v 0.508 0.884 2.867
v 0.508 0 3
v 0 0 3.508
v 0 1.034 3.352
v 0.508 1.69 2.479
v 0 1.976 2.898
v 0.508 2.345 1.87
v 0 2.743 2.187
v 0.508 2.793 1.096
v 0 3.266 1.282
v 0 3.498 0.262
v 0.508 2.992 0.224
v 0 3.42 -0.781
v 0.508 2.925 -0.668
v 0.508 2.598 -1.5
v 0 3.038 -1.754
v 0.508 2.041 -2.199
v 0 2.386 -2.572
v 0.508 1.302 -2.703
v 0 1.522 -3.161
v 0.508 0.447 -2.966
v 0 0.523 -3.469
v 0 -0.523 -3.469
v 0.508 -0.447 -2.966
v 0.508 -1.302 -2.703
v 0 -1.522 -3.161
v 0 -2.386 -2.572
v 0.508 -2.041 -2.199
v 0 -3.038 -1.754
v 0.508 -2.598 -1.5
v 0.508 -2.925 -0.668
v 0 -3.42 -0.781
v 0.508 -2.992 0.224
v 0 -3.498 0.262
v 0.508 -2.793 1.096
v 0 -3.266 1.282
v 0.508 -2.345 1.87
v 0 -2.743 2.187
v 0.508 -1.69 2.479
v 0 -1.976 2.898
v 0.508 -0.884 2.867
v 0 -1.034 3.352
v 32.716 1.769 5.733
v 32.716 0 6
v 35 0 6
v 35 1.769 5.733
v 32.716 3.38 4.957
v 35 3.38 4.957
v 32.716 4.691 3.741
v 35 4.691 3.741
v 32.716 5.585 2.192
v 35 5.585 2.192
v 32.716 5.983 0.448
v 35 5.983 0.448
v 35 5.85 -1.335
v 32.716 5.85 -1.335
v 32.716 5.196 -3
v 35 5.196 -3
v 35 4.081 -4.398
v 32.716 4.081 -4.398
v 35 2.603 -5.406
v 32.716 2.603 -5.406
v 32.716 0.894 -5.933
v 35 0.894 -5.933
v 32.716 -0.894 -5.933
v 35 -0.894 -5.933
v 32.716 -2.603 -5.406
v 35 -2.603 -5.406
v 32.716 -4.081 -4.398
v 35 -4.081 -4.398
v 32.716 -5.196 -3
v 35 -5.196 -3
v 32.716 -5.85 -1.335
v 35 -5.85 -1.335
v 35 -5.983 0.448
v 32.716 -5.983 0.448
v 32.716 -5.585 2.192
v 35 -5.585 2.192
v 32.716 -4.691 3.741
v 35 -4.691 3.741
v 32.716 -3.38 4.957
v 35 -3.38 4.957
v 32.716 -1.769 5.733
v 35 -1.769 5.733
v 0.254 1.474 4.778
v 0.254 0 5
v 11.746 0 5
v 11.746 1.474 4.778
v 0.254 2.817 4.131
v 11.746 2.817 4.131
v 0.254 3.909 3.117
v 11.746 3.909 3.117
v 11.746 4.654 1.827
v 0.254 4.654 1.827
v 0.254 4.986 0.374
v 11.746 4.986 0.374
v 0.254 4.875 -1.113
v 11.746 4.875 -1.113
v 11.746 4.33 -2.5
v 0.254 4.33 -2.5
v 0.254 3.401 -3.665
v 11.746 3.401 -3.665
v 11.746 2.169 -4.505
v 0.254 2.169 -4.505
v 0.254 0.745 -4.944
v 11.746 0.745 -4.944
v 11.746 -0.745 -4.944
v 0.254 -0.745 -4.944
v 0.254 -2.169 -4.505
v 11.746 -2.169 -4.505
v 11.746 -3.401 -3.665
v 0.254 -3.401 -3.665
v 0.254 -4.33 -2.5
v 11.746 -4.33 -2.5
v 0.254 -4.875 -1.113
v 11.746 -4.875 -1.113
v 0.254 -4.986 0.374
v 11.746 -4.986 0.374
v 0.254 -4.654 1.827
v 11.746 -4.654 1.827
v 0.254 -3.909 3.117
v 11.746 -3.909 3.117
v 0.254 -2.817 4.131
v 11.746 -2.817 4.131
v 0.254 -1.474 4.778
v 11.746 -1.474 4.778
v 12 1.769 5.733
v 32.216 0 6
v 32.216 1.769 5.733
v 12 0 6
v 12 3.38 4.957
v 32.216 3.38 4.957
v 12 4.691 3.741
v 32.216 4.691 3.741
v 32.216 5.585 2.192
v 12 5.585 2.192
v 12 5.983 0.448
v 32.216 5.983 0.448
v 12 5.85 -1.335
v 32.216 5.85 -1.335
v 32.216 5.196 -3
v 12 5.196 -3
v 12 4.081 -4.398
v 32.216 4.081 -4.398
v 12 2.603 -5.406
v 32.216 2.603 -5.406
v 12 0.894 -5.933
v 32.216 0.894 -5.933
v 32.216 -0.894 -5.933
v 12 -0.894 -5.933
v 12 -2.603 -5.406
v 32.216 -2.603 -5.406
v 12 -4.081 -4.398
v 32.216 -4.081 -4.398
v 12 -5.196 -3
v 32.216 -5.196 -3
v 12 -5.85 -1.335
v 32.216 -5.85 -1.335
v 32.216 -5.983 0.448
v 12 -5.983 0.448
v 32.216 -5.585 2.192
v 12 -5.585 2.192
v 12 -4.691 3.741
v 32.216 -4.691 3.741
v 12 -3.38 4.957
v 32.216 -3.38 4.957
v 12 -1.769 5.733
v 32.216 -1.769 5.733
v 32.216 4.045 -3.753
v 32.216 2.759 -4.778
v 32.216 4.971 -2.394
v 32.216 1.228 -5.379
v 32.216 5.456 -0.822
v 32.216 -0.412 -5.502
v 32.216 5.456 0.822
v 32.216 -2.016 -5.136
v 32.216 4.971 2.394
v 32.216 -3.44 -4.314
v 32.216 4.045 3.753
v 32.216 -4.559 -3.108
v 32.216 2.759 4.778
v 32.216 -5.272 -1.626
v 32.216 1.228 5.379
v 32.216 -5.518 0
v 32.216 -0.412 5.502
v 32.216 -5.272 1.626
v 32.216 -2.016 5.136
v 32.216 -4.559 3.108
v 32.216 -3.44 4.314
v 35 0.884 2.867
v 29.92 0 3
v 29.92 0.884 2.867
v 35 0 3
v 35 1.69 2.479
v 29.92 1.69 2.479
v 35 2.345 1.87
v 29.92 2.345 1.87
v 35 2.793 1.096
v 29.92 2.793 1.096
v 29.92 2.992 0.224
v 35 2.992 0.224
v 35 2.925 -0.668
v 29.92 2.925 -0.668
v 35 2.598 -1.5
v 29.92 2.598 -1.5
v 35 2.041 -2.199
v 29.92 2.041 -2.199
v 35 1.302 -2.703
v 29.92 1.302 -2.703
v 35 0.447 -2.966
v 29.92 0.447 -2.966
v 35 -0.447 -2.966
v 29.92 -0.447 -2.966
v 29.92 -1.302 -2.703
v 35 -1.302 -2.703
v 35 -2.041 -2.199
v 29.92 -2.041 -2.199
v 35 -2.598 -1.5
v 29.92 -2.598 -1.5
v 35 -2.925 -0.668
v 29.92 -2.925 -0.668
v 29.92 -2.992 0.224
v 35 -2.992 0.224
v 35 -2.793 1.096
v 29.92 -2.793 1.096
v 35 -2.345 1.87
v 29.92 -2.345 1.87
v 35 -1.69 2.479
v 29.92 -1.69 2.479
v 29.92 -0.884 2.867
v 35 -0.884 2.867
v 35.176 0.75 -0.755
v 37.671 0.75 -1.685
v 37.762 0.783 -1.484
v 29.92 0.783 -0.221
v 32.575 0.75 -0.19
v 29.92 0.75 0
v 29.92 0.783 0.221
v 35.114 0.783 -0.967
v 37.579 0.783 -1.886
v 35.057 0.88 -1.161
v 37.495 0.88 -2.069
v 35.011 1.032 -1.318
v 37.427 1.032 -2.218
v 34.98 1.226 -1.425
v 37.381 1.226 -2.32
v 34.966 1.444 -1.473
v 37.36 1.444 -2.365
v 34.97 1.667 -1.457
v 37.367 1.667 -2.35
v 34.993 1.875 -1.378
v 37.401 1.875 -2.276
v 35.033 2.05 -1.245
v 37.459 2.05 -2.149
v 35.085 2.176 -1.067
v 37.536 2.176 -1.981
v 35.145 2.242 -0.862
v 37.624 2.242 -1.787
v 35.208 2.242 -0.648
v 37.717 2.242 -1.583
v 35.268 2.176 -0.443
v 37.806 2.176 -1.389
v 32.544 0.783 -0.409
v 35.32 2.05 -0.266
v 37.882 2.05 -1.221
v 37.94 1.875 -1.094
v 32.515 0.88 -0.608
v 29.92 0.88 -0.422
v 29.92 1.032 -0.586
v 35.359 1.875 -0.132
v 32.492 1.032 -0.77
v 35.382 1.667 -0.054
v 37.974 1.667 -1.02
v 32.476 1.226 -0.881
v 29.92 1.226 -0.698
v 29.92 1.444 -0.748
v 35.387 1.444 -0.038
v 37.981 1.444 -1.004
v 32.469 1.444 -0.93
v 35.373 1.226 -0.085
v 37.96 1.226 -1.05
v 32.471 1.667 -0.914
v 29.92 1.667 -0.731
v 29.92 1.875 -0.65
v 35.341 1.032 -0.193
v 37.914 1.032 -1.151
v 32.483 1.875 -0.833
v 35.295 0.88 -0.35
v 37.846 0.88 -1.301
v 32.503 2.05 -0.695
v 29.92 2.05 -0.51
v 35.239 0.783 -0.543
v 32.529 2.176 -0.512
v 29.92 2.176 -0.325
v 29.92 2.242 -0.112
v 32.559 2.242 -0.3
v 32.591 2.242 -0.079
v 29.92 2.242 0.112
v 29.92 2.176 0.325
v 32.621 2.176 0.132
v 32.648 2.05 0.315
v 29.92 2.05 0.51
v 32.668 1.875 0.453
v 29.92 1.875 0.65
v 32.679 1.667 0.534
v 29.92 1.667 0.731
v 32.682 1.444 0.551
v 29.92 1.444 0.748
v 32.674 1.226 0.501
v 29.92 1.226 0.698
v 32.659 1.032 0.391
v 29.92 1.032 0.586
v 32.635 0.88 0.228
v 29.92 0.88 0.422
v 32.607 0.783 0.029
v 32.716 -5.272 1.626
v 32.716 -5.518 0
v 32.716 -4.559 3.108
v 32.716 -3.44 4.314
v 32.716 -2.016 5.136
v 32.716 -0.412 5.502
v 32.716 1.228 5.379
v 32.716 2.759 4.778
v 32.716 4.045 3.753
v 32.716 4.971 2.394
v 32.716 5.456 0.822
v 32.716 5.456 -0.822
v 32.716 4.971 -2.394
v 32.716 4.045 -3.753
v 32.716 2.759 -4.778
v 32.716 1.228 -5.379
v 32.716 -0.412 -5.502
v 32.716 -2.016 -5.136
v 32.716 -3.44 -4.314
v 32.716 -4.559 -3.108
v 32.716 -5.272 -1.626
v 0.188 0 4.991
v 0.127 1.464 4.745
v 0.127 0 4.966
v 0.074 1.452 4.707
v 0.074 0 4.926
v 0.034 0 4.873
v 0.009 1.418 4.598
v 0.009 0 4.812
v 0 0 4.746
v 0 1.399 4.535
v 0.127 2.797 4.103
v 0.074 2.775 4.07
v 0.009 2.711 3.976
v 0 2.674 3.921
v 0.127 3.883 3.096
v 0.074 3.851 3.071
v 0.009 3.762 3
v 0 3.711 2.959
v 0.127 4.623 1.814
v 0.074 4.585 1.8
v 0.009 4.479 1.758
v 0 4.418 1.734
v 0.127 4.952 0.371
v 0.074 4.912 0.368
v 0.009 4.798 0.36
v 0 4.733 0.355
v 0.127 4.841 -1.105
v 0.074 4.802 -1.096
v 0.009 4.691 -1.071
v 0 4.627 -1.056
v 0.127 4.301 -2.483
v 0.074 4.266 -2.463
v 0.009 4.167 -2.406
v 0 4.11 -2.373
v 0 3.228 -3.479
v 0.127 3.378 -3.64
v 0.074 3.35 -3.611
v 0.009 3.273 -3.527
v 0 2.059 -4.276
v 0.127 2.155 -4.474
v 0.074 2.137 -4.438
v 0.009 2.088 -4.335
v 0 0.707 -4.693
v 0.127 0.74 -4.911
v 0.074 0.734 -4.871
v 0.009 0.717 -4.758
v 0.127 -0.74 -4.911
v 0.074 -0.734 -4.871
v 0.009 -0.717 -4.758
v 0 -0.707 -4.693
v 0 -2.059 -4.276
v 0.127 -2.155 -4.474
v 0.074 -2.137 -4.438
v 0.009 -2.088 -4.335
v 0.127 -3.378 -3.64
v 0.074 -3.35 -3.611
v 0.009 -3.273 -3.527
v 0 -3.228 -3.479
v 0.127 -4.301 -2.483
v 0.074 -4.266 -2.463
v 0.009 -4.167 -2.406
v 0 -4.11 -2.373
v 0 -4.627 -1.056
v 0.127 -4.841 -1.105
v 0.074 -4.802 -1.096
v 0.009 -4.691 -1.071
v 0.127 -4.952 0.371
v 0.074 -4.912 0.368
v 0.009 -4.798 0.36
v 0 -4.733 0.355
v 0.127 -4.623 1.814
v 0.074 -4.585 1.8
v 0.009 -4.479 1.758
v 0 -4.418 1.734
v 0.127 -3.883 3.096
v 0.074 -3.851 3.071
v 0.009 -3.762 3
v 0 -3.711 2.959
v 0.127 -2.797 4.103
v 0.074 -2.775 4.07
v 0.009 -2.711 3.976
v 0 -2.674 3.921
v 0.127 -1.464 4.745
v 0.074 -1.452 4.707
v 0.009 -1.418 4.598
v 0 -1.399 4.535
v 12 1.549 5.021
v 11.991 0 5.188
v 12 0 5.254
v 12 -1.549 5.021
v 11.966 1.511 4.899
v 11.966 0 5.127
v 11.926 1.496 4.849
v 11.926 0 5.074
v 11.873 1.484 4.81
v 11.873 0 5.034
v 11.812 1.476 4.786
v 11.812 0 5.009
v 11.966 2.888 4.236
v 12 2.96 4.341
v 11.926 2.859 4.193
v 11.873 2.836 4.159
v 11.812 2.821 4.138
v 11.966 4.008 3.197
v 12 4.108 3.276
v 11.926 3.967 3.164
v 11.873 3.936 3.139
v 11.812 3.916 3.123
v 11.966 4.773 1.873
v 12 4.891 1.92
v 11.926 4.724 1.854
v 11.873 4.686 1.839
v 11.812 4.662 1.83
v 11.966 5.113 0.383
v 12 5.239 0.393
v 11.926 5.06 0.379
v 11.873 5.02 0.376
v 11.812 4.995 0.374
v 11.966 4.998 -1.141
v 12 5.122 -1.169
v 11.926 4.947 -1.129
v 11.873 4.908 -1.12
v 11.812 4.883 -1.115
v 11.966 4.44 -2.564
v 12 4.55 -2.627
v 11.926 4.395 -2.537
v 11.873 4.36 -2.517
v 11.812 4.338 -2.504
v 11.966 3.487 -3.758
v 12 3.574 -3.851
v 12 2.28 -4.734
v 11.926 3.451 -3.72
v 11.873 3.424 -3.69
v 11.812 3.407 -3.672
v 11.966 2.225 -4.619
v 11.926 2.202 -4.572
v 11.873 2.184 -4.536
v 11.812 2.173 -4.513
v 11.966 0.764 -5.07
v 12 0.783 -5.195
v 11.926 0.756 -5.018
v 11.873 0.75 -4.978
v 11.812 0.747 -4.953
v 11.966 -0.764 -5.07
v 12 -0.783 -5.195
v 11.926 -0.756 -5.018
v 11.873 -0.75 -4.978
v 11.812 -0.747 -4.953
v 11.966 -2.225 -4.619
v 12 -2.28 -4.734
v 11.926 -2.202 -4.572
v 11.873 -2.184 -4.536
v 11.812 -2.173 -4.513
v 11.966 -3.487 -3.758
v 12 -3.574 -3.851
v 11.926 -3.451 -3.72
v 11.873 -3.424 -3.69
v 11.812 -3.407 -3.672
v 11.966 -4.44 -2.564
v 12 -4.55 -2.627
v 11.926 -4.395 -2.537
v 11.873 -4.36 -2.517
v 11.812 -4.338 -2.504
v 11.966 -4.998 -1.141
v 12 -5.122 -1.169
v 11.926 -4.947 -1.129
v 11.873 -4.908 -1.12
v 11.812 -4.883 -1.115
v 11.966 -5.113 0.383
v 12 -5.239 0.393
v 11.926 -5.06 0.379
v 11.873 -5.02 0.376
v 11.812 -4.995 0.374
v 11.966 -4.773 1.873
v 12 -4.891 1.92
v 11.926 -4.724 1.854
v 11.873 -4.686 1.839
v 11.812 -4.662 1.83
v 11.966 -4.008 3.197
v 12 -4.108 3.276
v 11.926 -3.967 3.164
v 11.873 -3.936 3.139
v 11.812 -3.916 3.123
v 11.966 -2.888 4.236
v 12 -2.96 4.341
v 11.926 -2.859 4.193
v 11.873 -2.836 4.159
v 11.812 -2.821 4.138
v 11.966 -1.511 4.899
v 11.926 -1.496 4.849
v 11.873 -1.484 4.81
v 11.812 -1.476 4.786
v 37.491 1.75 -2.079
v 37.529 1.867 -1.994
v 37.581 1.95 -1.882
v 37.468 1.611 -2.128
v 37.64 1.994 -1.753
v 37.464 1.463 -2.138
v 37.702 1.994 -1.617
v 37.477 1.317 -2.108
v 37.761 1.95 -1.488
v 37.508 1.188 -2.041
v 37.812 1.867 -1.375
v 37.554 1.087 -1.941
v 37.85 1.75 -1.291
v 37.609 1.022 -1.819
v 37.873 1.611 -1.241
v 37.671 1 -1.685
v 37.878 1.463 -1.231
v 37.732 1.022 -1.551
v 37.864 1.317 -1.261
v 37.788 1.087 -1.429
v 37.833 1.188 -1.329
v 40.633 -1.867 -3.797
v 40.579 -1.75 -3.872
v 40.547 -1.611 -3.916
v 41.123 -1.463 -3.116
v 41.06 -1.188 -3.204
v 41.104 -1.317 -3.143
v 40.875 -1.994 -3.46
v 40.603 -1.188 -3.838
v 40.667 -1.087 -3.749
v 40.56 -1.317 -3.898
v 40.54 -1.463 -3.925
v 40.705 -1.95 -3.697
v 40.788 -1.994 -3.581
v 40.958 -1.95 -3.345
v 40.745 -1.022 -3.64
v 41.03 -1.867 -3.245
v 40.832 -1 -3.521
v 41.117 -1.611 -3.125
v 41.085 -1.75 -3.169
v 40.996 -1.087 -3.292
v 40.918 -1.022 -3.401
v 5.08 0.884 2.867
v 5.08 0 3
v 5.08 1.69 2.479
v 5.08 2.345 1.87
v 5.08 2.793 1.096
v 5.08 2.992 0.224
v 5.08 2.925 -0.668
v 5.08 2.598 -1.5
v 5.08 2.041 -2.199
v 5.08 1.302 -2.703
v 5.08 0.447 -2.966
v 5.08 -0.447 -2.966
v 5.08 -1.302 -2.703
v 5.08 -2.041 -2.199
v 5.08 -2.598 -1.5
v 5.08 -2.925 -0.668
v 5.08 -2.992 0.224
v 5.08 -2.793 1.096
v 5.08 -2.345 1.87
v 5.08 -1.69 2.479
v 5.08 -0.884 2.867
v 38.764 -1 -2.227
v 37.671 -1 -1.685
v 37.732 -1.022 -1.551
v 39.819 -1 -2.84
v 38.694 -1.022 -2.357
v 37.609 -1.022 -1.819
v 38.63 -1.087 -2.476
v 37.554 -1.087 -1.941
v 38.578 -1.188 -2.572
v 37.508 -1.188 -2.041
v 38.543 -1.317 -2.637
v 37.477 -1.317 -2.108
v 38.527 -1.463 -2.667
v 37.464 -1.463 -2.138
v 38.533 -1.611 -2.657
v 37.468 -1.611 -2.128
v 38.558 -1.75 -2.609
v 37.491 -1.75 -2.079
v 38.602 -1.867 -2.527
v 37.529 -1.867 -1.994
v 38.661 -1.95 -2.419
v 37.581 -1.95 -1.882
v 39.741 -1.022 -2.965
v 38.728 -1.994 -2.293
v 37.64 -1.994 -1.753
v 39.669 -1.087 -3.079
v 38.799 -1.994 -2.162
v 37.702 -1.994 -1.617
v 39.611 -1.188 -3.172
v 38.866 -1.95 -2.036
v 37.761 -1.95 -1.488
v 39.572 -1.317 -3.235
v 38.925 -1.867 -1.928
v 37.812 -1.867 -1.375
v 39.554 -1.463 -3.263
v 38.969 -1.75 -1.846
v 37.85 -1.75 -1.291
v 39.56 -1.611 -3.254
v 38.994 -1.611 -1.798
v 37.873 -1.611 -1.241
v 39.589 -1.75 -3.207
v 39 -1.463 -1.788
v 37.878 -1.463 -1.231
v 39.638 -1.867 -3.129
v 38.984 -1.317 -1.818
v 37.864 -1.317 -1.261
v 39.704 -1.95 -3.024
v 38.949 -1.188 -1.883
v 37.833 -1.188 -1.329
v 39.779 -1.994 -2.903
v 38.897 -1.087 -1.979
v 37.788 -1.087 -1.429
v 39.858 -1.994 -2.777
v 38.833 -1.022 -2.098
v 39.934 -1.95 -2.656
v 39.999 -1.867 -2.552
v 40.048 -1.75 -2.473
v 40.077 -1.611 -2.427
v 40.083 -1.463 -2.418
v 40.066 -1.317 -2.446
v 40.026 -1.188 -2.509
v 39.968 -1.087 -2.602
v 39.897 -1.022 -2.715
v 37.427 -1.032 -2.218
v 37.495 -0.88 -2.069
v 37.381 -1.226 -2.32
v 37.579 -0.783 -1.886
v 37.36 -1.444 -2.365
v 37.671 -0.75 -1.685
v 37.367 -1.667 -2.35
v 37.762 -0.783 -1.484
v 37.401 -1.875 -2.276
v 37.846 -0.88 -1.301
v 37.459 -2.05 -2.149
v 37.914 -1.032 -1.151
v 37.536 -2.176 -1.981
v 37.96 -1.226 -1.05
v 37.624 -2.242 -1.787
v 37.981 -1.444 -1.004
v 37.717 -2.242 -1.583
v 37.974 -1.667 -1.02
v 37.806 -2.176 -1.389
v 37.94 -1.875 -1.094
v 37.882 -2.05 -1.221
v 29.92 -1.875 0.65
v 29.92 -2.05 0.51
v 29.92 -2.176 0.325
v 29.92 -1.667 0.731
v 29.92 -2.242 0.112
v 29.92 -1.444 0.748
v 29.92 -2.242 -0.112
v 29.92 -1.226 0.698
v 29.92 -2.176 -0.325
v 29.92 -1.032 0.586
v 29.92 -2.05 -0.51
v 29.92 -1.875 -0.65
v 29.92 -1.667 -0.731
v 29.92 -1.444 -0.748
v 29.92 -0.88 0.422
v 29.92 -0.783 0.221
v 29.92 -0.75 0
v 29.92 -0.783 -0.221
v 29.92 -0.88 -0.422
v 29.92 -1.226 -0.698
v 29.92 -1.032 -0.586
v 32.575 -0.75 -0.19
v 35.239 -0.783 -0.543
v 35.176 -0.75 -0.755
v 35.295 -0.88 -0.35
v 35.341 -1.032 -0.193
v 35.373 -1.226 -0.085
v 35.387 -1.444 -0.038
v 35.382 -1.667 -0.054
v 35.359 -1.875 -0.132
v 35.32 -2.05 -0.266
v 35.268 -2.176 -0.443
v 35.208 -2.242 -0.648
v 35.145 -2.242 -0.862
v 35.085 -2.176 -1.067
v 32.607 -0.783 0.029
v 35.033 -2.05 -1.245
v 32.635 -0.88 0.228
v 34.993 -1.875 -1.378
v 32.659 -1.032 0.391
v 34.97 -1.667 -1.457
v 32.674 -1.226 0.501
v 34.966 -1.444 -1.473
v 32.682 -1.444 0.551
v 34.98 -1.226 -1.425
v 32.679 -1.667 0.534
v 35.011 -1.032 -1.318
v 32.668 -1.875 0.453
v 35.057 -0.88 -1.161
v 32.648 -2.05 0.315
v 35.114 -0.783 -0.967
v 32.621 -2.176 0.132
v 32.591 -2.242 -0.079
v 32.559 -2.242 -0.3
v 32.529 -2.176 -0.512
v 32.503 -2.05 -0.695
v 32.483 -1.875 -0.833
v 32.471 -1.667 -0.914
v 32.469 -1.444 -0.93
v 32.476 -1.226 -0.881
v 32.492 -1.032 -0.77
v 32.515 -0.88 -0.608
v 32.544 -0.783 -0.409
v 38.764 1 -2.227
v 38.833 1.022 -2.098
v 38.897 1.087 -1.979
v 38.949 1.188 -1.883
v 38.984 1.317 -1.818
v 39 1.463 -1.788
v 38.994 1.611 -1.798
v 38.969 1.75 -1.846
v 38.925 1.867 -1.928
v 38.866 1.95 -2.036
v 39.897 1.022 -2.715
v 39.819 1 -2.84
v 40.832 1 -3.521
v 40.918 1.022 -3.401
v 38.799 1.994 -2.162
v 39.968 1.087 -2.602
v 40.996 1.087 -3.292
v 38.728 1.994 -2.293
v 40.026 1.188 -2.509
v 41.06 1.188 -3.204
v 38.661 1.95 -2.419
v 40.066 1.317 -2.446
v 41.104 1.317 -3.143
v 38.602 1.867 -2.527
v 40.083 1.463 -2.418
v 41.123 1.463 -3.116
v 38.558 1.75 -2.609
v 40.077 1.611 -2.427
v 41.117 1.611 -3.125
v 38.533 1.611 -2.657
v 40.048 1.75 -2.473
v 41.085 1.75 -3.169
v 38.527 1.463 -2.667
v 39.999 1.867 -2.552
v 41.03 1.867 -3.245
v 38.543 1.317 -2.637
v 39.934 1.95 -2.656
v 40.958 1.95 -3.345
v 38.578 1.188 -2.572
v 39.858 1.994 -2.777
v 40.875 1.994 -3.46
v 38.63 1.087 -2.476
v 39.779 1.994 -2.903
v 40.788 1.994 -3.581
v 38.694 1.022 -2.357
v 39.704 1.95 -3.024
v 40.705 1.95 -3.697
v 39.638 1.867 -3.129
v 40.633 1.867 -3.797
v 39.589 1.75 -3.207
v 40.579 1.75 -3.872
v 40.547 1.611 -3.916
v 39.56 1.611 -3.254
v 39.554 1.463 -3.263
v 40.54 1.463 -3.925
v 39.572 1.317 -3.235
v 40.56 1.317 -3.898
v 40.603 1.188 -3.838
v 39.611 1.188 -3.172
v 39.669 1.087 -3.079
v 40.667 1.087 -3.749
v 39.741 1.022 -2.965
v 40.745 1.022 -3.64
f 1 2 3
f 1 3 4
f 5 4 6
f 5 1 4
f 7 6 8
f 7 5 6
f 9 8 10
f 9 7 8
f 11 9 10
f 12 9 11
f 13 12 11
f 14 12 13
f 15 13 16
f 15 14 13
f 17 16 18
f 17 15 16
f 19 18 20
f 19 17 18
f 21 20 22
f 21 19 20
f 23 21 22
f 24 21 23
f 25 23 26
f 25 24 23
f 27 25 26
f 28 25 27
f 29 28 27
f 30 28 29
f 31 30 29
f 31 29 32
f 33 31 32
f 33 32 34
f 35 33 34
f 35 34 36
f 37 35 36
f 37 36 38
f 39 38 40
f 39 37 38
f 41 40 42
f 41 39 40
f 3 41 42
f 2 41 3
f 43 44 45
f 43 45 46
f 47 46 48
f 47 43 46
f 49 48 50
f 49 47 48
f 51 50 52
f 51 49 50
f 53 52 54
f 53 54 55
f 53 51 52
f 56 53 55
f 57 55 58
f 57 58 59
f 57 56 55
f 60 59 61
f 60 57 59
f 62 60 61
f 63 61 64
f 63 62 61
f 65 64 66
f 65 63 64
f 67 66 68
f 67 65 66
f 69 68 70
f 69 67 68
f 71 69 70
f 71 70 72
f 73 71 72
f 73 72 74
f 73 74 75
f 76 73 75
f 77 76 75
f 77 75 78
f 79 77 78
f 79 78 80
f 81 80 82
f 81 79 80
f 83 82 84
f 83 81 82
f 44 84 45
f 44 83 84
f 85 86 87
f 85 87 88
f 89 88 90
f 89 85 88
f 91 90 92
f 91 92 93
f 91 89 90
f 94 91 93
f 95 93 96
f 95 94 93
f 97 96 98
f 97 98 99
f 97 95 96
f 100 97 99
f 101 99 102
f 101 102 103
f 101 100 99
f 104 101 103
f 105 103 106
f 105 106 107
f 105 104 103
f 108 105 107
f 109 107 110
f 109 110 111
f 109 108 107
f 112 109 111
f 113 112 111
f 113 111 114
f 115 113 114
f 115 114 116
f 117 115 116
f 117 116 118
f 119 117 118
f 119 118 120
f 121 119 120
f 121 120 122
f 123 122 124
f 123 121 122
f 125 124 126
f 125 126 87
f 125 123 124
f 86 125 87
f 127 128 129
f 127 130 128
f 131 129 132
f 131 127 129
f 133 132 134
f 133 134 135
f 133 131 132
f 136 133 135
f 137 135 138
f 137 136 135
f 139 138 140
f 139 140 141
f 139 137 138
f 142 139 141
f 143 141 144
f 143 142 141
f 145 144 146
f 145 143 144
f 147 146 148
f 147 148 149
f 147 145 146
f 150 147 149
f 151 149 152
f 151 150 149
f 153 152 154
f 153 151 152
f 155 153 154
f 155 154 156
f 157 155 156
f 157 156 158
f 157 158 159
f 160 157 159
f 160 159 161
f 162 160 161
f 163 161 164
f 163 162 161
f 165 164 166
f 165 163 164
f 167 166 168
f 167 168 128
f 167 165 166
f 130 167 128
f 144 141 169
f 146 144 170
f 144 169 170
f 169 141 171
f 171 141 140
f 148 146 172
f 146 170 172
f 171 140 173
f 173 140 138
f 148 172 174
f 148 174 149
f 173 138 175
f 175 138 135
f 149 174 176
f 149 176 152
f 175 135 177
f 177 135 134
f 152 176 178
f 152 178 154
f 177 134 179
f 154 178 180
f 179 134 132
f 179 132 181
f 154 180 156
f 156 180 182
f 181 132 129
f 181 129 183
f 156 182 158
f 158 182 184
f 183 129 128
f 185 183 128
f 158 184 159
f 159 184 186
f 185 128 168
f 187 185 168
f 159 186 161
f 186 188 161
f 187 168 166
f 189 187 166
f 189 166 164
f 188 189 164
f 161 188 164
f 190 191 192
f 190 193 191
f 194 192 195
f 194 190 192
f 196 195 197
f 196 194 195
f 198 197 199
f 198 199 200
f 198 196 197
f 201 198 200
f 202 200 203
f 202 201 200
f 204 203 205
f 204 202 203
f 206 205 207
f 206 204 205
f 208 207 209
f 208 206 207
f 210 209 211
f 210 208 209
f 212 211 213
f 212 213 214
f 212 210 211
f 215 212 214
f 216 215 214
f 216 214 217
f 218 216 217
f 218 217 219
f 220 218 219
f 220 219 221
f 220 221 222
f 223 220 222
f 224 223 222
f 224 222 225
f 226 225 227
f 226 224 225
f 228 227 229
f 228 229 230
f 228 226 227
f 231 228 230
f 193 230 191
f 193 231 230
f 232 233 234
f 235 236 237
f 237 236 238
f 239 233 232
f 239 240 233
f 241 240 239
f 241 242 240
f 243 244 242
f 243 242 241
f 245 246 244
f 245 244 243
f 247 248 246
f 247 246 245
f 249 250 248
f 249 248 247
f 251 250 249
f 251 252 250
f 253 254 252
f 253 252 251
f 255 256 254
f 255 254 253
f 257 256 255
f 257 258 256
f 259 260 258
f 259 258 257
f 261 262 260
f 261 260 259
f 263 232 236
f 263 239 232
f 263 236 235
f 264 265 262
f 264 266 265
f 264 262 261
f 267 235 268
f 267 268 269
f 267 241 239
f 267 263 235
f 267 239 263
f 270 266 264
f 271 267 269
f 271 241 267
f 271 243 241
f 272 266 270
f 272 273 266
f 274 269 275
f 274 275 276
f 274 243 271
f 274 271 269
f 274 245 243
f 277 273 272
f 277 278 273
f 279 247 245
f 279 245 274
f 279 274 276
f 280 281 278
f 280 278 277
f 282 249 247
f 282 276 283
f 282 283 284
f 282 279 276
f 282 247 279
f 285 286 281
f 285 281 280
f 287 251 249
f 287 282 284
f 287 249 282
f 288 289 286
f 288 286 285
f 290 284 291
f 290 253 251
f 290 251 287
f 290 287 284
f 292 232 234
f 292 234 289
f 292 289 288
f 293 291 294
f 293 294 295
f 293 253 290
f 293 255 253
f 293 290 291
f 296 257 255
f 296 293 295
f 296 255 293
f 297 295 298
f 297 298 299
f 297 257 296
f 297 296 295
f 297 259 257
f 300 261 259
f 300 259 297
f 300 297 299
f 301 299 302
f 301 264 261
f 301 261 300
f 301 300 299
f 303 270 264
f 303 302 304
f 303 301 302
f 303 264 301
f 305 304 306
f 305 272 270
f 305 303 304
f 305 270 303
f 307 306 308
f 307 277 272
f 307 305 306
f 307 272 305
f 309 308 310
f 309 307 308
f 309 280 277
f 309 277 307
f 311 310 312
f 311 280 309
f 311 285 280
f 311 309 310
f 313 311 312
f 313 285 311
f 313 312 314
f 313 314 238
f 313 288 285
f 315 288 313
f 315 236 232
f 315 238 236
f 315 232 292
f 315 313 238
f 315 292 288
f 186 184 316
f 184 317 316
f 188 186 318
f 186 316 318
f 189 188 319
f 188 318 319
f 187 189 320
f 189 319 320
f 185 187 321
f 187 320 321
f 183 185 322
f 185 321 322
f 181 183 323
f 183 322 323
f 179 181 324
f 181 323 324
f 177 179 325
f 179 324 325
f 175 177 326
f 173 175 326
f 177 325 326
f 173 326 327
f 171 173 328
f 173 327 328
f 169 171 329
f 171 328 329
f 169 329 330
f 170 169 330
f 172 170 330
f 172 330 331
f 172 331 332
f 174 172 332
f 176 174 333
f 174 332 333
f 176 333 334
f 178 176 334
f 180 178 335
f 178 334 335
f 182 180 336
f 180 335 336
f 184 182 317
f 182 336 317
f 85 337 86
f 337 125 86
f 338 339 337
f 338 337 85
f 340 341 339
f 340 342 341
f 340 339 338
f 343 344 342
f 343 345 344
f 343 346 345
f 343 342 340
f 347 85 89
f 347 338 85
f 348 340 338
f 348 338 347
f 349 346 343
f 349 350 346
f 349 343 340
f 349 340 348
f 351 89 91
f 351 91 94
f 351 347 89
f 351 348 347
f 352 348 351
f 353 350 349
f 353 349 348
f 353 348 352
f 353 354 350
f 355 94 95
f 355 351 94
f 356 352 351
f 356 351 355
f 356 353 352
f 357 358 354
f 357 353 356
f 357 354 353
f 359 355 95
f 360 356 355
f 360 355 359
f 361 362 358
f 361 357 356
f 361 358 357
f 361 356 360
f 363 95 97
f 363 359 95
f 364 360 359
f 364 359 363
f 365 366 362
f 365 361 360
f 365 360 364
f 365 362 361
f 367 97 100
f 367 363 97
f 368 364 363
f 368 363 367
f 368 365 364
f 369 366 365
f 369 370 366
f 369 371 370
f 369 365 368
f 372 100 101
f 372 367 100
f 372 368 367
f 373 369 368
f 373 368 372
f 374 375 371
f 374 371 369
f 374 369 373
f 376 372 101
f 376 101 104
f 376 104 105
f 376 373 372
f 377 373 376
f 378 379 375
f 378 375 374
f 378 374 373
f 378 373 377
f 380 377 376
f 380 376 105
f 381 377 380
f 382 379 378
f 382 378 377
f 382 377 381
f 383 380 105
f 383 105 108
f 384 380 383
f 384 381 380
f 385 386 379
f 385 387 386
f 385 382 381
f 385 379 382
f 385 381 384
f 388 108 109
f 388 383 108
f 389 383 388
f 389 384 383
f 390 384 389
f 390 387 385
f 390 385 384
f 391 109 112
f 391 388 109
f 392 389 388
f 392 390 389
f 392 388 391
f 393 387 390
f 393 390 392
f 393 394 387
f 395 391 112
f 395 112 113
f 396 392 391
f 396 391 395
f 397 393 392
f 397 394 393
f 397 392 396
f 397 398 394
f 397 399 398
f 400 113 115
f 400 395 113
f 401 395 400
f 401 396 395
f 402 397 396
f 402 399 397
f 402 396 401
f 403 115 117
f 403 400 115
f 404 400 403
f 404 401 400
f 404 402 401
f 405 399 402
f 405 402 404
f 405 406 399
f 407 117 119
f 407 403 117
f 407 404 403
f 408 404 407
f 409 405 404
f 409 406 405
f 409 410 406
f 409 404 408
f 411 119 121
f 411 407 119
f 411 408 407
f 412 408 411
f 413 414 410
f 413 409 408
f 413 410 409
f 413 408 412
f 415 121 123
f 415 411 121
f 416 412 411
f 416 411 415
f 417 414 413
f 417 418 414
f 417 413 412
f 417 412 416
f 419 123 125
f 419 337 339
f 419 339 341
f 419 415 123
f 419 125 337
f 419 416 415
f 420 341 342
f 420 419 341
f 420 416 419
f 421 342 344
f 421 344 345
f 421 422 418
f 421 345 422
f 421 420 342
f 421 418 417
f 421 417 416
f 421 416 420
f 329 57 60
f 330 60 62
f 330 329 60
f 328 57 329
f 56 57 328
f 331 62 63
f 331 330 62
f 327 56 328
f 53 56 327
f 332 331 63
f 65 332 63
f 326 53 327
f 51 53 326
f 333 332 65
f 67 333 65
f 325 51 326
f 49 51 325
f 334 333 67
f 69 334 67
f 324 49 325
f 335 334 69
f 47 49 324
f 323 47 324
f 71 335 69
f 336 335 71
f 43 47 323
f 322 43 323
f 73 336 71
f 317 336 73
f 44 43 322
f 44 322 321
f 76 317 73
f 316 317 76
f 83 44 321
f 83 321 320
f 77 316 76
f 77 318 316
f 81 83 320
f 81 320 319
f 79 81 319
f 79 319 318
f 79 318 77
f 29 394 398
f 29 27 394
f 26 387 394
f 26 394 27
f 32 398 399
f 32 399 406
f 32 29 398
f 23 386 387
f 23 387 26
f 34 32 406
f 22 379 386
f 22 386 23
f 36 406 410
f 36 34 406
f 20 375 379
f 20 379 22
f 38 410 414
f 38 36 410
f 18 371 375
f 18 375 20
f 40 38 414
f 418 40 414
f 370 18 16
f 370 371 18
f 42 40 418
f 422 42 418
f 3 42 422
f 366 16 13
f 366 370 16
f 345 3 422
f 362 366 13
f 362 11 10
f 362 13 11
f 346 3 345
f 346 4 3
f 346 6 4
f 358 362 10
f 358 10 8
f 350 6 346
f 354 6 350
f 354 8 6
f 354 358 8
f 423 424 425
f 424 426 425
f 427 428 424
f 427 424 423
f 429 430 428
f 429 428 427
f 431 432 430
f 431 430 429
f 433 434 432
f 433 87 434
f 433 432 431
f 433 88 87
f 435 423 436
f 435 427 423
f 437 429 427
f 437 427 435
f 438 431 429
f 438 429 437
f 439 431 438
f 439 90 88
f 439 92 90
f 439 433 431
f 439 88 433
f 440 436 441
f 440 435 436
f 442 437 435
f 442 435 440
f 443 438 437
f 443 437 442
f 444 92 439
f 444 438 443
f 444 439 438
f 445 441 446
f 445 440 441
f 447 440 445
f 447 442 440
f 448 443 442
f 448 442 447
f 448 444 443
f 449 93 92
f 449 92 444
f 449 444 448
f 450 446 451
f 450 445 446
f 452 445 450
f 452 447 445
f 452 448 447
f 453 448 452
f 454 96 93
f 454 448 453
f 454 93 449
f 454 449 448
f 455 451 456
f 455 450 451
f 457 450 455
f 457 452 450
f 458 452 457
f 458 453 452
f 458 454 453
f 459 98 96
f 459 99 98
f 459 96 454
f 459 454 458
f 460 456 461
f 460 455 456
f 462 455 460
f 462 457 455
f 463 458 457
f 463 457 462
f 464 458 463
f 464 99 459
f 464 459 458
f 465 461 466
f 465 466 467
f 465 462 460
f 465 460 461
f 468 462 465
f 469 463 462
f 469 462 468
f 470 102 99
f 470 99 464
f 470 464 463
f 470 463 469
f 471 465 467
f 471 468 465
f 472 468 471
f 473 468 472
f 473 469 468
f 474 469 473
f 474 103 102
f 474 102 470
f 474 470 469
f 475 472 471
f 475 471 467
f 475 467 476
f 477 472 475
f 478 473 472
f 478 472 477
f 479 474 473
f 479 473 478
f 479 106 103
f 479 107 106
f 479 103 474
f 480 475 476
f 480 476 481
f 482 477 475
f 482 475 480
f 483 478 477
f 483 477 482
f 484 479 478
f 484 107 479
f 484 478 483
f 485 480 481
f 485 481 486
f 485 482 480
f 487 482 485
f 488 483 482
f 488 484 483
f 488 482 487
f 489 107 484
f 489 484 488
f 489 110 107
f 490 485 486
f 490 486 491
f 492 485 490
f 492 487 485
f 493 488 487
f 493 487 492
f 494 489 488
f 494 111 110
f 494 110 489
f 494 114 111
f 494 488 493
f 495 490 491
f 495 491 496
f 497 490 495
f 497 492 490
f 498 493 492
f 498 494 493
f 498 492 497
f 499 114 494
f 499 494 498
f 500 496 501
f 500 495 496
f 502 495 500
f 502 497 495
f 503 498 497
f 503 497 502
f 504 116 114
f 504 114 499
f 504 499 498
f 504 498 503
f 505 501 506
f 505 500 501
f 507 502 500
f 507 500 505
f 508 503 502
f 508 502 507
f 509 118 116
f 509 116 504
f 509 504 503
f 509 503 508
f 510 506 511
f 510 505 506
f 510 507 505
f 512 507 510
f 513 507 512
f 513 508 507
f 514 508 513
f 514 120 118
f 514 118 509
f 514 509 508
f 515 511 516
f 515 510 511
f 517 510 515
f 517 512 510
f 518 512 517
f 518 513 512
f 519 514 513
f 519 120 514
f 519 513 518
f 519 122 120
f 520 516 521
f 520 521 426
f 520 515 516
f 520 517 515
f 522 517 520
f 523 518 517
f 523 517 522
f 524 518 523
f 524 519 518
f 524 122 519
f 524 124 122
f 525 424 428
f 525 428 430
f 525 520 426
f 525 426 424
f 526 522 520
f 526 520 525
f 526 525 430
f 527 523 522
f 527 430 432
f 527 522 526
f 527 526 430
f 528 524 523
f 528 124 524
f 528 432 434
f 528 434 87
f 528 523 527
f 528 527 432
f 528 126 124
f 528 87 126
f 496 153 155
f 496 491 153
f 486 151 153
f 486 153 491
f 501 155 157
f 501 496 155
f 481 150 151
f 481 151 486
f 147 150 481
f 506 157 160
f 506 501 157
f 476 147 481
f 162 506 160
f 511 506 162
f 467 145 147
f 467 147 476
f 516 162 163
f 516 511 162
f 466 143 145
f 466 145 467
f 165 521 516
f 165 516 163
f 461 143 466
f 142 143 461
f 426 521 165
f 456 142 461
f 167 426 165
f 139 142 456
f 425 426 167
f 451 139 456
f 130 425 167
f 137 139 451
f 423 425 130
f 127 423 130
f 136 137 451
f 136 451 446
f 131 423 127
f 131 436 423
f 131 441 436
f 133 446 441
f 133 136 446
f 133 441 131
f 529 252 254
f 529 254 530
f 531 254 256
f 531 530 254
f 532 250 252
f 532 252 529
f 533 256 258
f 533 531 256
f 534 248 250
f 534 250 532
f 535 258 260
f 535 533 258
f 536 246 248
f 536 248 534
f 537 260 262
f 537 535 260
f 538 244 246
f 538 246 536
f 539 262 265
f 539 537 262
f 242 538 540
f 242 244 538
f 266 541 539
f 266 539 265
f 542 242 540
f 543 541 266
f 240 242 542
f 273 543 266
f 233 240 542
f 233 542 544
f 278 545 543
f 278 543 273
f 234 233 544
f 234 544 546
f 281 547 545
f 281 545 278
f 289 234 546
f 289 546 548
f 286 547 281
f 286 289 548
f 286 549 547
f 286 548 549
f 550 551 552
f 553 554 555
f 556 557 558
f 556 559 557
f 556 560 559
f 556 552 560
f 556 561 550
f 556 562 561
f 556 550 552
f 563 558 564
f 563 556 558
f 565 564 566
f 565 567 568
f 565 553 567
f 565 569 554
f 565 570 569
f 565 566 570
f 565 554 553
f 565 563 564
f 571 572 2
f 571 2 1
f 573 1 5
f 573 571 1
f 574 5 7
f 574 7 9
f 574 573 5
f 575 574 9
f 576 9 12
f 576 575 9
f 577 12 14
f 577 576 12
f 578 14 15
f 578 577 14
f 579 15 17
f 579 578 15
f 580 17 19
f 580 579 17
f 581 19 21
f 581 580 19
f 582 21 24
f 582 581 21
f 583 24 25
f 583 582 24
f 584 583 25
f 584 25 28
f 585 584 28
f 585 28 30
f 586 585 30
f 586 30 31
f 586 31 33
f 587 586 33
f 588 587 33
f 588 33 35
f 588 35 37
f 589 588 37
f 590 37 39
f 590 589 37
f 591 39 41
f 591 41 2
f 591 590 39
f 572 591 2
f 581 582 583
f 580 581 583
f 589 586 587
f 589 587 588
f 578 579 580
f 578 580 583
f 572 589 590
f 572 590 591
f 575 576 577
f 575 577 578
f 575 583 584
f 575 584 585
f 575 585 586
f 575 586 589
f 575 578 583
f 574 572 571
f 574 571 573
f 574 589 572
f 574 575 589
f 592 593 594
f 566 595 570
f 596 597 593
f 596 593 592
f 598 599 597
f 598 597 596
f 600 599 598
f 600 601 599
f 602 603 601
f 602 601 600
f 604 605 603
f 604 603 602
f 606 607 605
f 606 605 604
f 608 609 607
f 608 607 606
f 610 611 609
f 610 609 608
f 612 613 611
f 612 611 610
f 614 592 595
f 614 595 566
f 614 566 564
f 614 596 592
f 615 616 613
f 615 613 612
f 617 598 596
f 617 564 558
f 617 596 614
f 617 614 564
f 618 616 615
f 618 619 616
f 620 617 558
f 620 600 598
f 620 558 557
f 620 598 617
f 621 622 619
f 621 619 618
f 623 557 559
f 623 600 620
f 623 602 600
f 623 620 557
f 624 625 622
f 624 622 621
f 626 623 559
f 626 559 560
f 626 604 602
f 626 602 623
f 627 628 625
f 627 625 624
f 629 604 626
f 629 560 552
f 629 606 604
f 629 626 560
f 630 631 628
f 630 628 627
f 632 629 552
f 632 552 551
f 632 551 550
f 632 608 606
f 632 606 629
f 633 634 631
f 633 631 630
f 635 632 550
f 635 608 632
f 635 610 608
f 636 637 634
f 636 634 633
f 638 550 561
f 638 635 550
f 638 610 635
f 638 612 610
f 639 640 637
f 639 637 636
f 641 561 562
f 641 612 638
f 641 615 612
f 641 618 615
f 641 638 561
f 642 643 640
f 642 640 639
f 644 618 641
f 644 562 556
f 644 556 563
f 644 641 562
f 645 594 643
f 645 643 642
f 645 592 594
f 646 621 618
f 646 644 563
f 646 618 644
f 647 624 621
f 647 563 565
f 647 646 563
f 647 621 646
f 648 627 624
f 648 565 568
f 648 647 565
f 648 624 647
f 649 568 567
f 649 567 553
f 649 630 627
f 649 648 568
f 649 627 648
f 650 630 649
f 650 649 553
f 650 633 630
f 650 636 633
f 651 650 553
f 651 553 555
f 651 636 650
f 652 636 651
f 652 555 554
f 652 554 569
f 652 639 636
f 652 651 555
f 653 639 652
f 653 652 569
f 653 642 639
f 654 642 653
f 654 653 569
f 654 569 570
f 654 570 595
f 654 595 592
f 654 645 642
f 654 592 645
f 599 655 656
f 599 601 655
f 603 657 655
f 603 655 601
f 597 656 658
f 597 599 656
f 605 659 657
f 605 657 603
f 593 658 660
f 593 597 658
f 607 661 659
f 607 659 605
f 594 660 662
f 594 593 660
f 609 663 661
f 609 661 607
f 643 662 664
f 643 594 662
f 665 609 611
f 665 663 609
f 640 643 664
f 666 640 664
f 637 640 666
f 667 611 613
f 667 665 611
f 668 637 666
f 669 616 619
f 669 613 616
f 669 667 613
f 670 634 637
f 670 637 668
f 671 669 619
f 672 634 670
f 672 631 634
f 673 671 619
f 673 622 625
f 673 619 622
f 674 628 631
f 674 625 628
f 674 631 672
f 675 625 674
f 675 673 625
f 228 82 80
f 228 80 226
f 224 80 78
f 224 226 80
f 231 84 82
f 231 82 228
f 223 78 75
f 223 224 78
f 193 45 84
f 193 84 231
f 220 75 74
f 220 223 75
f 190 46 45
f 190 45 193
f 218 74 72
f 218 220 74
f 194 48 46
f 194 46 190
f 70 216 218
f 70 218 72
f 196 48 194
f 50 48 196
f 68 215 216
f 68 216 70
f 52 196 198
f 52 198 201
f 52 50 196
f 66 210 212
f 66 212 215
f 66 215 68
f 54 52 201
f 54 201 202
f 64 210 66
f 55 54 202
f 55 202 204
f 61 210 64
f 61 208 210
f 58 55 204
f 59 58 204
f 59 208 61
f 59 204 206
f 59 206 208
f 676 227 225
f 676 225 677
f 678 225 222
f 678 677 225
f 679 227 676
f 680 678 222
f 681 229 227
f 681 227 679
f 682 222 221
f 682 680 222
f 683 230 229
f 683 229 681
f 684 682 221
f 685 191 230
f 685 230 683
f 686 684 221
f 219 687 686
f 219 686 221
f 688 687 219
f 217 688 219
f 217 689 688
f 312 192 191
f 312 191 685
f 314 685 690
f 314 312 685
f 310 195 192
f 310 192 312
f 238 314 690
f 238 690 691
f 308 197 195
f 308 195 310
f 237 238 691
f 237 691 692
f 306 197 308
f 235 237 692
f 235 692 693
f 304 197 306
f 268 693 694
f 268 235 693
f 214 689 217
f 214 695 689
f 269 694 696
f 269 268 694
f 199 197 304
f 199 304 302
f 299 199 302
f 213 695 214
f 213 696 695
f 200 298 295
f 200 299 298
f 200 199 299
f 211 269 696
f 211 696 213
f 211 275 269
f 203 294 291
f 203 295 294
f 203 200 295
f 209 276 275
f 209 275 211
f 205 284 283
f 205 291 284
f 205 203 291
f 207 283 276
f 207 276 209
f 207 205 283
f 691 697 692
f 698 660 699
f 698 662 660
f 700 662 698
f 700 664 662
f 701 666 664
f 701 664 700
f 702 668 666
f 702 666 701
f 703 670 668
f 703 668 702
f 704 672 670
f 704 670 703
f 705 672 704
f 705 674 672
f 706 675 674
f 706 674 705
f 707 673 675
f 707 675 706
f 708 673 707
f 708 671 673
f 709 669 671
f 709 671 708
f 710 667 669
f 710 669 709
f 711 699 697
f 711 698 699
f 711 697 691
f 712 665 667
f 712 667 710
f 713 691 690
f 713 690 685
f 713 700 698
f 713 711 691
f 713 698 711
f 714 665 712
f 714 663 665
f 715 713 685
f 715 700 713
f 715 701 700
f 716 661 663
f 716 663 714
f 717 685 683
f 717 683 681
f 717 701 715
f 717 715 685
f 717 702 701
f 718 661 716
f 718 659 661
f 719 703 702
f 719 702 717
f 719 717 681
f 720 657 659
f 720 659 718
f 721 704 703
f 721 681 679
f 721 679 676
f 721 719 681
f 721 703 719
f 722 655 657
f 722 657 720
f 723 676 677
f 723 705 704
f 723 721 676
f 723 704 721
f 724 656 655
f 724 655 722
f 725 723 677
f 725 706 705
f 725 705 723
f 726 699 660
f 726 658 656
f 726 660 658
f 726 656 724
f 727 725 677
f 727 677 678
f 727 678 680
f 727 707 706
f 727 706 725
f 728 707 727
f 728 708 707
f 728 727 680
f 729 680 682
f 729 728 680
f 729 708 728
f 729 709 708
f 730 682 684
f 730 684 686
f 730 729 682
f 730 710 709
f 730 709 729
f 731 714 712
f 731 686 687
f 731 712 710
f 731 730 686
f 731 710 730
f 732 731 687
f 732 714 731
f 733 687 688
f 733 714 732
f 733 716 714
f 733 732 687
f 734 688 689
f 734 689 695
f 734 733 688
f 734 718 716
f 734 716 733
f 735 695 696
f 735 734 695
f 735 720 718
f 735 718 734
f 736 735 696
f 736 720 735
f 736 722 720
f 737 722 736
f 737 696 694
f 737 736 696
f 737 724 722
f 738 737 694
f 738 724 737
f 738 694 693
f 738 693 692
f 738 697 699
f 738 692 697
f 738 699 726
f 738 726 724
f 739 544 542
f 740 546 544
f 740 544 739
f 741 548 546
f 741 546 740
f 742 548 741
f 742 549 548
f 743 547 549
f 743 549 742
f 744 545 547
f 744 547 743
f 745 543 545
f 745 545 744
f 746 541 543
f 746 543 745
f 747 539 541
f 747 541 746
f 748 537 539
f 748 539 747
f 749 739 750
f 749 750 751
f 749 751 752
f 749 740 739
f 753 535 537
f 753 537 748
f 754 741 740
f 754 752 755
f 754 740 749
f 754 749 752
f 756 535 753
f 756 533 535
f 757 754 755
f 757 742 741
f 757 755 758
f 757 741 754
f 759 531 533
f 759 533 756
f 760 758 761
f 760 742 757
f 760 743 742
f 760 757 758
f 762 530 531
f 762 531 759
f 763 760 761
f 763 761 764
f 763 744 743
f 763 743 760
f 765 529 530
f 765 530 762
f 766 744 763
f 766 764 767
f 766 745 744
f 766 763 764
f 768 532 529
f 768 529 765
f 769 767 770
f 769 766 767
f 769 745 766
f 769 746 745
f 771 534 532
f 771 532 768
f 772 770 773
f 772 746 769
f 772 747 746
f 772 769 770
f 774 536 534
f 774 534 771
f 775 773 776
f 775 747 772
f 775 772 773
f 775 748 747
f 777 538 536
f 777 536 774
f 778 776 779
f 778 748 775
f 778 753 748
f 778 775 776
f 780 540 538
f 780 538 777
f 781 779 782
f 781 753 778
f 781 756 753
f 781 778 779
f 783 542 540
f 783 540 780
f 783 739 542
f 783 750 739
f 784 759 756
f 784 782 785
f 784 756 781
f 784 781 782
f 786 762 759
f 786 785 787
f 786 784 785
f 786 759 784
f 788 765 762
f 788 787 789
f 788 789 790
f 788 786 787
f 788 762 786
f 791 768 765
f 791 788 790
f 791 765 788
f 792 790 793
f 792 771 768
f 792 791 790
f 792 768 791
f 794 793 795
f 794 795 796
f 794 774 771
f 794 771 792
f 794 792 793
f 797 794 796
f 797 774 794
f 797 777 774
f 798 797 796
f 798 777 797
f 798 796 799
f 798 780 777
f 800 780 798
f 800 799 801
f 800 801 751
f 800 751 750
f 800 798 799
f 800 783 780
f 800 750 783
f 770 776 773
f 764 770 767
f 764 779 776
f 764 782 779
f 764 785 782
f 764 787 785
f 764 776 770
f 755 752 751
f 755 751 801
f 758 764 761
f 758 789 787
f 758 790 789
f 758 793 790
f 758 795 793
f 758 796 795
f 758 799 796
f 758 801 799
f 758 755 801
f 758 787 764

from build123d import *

# Parameters (mm, degrees)
F2_R     = 0.5
F2_R_2   = 0.75
F6_W     = 0.5
F6_H     = 0.575756
F8_R     = 0.254
F9_R     = 0.254
F10_SIZE = 0.508


with BuildPart() as f1:
    # F0 (on Front) → F1 (revolve)
    with BuildSketch(Plane.XZ):
        Polygon((0, 5), (0, 3), (5.08, 3), (5.08, 0), (29.92, 0), (29.92, 3), (35, 3), (35, 6), (12, 6), (12, 5), align=None)
    revolve(axis=Axis((17.5, 0, 0), (-1, 0, 0)))

    # F4: sweep along a path in F3
    with BuildLine(Plane.XZ) as f4_path:
        ThreePointArc((37.670611, -1.684892), (33.885817, -0.426085), (29.92, 0))
    # F2 (on face) → F4 (sweep)
    with BuildSketch(Plane.YZ.offset(29.92)):
        with BuildLine():
            ThreePointArc((2, 0), (1.5, 0.5), (1, 0))
            ThreePointArc((1, 0), (1.5, -0.5), (2, 0))
        make_face()
        with BuildLine():
            ThreePointArc((2.25, 0), (1.5, 0.75), (0.75, 0))
            ThreePointArc((0.75, 0), (1.5, -0.75), (2.25, 0))
        make_face()
        with BuildLine():
            ThreePointArc((2, 0), (1.5, -0.5), (1, 0))
            ThreePointArc((1, 0), (1.5, 0.5), (2, 0))
        make_face(mode=Mode.SUBTRACT)
        with Locations((-1.5, 0)):
            Circle(F2_R)
        with Locations((-1.5, 0)):
            Circle(F2_R_2)
        with Locations((-1.5, 0)):
            Circle(F2_R, mode=Mode.SUBTRACT)
    sweep(path=f4_path.line)

    # F5: sweep along a path in F3
    with BuildLine(Plane.XZ) as f5_path:
        ThreePointArc((29.92, 0), (35.652775, -0.901979), (40.831604, -3.52076))
    # F2 (on face) → F5 (sweep)
    with BuildSketch(Plane.YZ.offset(29.92)):
        with Locations((-1.5, 0)):
            Circle(F2_R)
        with BuildLine():
            ThreePointArc((2, 0), (1.5, 0.5), (1, 0))
            ThreePointArc((1, 0), (1.5, -0.5), (2, 0))
        make_face()
    sweep(path=f5_path.line)

    # F6 (on Top) → F7 (revolve, cut)
    with BuildSketch(Plane.XY):
        with Locations((32.466017, -5.805497)):
            Rectangle(F6_W, F6_H)
    revolve(axis=Axis((32.14075, 0, 0), (-1, 0, 0)), mode=Mode.SUBTRACT)

    # F8
    f8_edges = [f1.edges().sort_by_distance(p)[0] for p in [
        (12, 0, -5),
    ]]
    fillet(f8_edges, radius=F8_R)

    # F9
    f9_edges = [f1.edges().sort_by_distance(p)[0] for p in [
        (0, 0, -5),
    ]]
    fillet(f9_edges, radius=F9_R)

    # F10
    f10_edges = [f1.edges().sort_by_distance(p)[0] for p in [
        (0, 0, -3),
    ]]
    chamfer(f10_edges, length=F10_SIZE)


solid = f1.part
